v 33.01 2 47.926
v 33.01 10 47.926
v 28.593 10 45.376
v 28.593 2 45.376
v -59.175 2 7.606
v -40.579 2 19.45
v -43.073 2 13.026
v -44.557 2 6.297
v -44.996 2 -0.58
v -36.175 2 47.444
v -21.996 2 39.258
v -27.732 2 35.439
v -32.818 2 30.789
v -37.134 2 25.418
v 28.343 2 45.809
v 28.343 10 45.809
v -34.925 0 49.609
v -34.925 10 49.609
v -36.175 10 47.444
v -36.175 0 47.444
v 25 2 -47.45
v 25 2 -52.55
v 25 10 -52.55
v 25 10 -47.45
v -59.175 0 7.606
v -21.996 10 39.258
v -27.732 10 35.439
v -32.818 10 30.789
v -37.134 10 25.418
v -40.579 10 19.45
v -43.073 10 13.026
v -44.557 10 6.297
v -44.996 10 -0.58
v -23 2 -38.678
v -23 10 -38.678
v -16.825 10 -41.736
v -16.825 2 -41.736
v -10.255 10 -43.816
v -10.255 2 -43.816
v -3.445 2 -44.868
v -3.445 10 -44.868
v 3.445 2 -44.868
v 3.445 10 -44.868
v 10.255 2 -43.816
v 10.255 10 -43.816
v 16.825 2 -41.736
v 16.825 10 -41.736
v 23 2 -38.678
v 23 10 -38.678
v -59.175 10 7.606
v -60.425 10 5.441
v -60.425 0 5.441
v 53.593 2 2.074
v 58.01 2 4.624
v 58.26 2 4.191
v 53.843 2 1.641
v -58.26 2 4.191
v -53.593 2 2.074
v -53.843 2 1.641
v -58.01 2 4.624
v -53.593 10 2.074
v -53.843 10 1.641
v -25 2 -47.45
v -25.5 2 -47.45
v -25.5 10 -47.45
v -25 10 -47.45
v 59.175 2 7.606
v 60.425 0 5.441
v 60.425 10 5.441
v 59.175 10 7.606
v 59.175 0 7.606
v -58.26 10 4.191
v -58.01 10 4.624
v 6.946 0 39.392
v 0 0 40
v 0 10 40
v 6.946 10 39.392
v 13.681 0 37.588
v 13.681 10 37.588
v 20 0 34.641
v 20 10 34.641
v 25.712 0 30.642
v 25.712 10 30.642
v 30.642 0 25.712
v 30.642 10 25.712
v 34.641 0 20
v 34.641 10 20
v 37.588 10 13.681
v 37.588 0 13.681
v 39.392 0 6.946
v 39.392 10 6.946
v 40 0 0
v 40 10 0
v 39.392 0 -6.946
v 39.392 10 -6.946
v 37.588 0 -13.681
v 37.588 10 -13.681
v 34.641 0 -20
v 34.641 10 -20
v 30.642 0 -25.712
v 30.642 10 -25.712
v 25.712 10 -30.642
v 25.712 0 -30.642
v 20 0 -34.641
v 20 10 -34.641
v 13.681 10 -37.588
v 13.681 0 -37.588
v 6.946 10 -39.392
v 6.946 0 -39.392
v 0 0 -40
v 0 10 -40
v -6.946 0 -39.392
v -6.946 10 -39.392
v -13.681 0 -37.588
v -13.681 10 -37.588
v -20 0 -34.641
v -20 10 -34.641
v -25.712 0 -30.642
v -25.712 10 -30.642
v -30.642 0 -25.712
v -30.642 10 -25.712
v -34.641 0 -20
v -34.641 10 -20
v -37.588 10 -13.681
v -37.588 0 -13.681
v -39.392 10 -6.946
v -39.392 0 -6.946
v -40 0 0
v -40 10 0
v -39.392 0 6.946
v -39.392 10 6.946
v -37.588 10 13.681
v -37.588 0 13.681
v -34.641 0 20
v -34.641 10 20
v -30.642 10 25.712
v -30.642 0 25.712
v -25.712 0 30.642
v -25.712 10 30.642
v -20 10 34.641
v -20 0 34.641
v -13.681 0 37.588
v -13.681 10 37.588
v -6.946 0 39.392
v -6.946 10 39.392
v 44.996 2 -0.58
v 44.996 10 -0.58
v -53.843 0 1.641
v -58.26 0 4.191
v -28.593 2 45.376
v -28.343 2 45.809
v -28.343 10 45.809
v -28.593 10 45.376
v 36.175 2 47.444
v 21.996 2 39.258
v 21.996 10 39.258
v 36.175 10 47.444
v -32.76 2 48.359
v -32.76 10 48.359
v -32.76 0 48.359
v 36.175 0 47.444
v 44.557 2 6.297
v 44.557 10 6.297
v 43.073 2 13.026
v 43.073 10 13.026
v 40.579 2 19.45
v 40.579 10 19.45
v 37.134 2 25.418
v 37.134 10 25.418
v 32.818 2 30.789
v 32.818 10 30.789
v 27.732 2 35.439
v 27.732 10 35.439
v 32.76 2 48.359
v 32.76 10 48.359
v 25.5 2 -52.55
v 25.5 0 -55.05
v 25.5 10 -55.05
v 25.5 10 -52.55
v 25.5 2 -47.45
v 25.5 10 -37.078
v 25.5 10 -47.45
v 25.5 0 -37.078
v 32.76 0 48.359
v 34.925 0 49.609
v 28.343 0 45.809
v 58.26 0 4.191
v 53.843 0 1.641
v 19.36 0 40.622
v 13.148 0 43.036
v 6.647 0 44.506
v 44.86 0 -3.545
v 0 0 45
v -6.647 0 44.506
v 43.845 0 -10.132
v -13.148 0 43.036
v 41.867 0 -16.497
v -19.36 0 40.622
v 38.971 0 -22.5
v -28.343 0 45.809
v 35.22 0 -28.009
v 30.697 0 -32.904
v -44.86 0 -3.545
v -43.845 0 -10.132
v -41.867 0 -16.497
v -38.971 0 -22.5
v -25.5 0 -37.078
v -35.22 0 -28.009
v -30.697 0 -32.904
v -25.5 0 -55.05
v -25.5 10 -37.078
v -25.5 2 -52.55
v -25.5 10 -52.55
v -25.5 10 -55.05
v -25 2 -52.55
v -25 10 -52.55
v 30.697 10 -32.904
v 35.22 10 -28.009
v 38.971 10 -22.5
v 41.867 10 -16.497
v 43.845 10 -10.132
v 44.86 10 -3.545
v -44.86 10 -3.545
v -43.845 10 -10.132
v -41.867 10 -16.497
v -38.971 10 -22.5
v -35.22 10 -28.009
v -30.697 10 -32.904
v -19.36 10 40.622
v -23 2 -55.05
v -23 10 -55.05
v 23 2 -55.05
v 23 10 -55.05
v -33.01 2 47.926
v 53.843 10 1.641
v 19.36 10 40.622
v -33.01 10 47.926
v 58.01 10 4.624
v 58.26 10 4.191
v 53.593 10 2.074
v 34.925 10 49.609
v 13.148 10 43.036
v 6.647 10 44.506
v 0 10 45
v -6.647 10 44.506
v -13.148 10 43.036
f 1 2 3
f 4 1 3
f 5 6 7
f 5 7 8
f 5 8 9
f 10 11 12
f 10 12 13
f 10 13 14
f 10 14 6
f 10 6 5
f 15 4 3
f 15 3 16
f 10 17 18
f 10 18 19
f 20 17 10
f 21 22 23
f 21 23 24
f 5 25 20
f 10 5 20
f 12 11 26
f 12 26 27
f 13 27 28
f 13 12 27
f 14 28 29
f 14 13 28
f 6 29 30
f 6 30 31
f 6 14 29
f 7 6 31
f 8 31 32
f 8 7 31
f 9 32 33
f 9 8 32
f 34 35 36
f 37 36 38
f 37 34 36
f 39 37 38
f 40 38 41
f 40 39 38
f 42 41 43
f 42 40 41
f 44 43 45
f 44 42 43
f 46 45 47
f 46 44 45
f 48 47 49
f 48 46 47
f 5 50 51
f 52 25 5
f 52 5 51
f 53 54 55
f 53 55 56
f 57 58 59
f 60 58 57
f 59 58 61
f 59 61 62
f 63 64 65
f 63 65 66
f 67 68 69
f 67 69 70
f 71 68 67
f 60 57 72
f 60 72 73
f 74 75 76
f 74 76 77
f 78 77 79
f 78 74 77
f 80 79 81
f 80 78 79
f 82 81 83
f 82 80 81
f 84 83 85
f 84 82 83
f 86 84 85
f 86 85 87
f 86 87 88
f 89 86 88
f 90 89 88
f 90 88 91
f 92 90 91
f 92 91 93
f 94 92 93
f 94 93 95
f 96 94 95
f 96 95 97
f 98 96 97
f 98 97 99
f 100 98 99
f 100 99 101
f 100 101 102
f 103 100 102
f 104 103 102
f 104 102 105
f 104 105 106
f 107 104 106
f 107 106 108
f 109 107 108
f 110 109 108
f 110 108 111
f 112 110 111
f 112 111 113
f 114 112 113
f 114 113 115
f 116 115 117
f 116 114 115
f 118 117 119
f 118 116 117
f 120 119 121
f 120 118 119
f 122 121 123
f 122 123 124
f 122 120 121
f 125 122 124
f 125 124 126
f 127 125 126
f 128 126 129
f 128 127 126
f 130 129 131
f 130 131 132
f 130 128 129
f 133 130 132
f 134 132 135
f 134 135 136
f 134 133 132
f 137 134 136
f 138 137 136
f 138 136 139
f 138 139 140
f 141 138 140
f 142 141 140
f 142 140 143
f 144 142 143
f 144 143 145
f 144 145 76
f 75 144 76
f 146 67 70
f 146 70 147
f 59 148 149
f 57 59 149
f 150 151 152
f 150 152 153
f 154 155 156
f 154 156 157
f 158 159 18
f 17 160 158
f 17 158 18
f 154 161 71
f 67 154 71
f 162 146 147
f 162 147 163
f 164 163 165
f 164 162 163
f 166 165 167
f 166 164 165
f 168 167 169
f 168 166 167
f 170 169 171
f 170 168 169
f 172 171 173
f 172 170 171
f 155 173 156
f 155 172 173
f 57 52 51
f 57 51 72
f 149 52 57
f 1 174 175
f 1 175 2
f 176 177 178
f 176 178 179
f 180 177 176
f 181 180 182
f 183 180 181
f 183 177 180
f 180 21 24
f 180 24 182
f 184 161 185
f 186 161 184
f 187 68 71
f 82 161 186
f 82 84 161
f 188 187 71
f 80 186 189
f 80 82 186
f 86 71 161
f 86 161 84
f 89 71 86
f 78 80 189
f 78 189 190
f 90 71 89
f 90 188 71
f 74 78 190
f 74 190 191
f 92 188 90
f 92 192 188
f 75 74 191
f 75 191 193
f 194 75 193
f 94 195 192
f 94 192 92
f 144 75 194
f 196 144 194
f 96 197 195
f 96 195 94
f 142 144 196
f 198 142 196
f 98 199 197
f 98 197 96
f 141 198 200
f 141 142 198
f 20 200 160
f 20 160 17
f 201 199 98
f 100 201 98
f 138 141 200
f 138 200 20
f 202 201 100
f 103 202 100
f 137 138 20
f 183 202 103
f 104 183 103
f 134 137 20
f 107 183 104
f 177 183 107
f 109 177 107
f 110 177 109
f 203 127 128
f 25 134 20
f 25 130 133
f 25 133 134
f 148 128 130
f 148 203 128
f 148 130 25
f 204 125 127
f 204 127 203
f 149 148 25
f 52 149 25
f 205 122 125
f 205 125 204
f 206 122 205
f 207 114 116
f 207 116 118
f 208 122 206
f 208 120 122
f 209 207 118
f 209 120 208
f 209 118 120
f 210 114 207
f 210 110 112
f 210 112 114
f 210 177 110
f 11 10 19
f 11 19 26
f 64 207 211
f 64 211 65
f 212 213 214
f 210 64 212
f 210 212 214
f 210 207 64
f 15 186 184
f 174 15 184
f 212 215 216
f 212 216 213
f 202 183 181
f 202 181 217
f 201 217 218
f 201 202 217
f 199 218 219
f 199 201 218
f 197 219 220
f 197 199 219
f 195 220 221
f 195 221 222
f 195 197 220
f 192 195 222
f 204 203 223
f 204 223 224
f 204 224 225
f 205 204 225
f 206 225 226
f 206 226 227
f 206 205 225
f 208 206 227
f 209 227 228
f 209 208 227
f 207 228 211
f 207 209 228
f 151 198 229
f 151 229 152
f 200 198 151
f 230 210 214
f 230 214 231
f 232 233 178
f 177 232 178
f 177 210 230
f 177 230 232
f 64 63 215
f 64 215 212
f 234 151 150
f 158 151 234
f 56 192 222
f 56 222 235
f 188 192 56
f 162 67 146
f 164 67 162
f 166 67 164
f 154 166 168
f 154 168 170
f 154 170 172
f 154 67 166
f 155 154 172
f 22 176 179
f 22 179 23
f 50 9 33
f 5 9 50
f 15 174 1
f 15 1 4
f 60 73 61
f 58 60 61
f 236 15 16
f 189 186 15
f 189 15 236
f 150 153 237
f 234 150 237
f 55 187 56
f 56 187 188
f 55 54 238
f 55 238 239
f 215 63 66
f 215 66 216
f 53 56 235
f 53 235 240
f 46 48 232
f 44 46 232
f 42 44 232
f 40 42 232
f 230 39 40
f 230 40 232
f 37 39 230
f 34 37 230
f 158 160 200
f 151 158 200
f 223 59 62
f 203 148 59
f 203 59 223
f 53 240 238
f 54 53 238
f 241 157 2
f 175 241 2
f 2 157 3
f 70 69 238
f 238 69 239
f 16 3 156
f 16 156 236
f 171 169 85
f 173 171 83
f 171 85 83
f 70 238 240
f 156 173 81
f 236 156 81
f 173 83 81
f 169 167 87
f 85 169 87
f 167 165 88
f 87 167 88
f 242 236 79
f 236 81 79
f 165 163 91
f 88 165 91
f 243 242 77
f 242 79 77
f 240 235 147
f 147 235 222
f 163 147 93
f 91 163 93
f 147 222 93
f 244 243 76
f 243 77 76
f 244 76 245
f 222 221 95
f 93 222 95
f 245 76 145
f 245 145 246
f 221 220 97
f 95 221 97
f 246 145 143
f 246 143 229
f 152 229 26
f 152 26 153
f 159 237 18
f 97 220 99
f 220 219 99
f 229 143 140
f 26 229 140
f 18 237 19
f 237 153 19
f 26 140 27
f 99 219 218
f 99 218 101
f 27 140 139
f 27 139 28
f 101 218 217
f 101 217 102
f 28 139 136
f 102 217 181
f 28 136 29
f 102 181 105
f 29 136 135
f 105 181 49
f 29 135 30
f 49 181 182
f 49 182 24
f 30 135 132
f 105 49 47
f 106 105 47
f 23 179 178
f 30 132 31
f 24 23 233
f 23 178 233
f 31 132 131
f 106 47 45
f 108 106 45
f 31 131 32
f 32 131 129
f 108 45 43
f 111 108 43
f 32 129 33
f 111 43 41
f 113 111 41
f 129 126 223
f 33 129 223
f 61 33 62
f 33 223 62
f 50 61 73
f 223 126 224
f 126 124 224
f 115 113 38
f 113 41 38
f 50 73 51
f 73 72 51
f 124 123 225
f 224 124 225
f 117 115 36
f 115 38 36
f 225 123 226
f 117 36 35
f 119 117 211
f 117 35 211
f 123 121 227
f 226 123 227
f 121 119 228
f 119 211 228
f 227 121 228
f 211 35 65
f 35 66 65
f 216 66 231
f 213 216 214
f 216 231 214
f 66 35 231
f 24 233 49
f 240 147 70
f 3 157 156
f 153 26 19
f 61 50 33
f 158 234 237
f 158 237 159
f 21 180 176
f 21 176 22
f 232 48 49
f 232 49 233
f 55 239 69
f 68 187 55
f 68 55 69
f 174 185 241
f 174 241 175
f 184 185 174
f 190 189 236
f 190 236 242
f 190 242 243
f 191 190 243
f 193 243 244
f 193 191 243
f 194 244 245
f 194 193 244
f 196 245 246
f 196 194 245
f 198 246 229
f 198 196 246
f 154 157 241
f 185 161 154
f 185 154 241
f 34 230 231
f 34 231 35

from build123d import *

# Parameters (mm, degrees)
SKETCH1_R           = 40
BOSS_EXTRUDE1_DEPTH = 10
SKETCH2_R           = 40
BOSS_EXTRUDE2_DEPTH = 2


with BuildPart() as part:
    # Sketch1 → Boss-Extrude1 (new body)
    with BuildSketch(Plane(origin=(0, 0, 0), x_dir=(1, 0, 0), z_dir=(0, 1, 0))):
        with BuildLine():
            Line((-25.5, 37.077621283), (-25.5, 47.45))
            Line((-25.5, 47.45), (-25, 47.45))
            Line((-25, 47.45), (-25, 52.55))
            Line((-25, 52.55), (-25.5, 52.55))
            Line((-25.5, 52.55), (-25.5, 55.05))
            Line((-25.5, 55.05), (-23, 55.05))
            Line((-23, 55.05), (-23, 38.678159212))
            ThreePointArc((-23, 38.678159212), (0, 45), (23, 38.678159212))
            Line((23, 38.678159212), (23, 55.05))
            Line((23, 55.05), (25.5, 55.05))
            Line((25.5, 55.05), (25.5, 52.55))
            Line((25.5, 52.55), (25, 52.55))
            Line((25, 52.55), (25, 47.45))
            Line((25, 47.45), (25.5, 47.45))
            Line((25.5, 47.45), (25.5, 37.077621283))
            ThreePointArc((25.5, 37.077621283), (38.97114317, 22.5), (44.860161943, 3.544837155))
            Line((44.860161943, 3.544837155), (53.84290541, -1.641352203))
            Line((53.84290541, -1.641352203), (53.59290541, -2.074364905))
            Line((53.59290541, -2.074364905), (58.009634969, -4.624364905))
            Line((58.009634969, -4.624364905), (58.259634969, -4.191352203))
            Line((58.259634969, -4.191352203), (60.424698478, -5.441352203))
            Line((60.424698478, -5.441352203), (59.174698478, -7.606415713))
            Line((59.174698478, -7.606415713), (44.996268449, 0.579504681))
            ThreePointArc((44.996268449, 0.579504681), (38.97114317, -22.5), (21.996268449, -39.257663893))
            Line((21.996268449, -39.257663893), (36.174698478, -47.443584287))
            Line((36.174698478, -47.443584287), (34.924698478, -49.608647797))
            Line((34.924698478, -49.608647797), (32.759634969, -48.358647797))
            Line((32.759634969, -48.358647797), (33.009634969, -47.925635095))
            Line((33.009634969, -47.925635095), (28.59290541, -45.375635095))
            Line((28.59290541, -45.375635095), (28.34290541, -45.808647797))
            Line((28.34290541, -45.808647797), (19.360161943, -40.622458438))
            ThreePointArc((19.360161943, -40.622458438), (0, -45), (-19.360161943, -40.622458438))
            Line((-19.360161943, -40.622458438), (-28.34290541, -45.808647797))
            Line((-28.34290541, -45.808647797), (-28.59290541, -45.375635095))
            Line((-28.59290541, -45.375635095), (-33.009634969, -47.925635095))
            Line((-33.009634969, -47.925635095), (-32.759634969, -48.358647797))
            Line((-32.759634969, -48.358647797), (-34.924698478, -49.608647797))
            Line((-34.924698478, -49.608647797), (-36.174698478, -47.443584287))
            Line((-36.174698478, -47.443584287), (-21.996268449, -39.257663893))
            ThreePointArc((-21.996268449, -39.257663893), (-38.97114317, -22.5), (-44.996268449, 0.579504681))
            Line((-44.996268449, 0.579504681), (-59.174698478, -7.606415713))
            Line((-59.174698478, -7.606415713), (-60.424698478, -5.441352203))
            Line((-60.424698478, -5.441352203), (-58.259634969, -4.191352203))
            Line((-58.259634969, -4.191352203), (-58.009634969, -4.624364905))
            Line((-58.009634969, -4.624364905), (-53.59290541, -2.074364905))
            Line((-53.59290541, -2.074364905), (-53.84290541, -1.641352203))
            Line((-53.84290541, -1.641352203), (-44.860161943, 3.544837155))
            ThreePointArc((-44.860161943, 3.544837155), (-38.97114317, 22.5), (-25.5, 37.077621283))
        make_face()
        with Locations(Location((0, 0, 0), (0, 0, 270))):
            Circle(SKETCH1_R, mode=Mode.SUBTRACT)
    extrude(amount=BOSS_EXTRUDE1_DEPTH)

    # Sketch2 → Boss-Extrude2 (add)
    with BuildSketch(Plane.XZ):
        with BuildLine():
            Line((-60.424698478, 5.441352203), (-34.924698478, 49.608647797))
            Line((-34.924698478, 49.608647797), (-19.360161943, 40.622458438))
            ThreePointArc((-19.360161943, 40.622458438), (0, 45), (19.360161943, 40.622458438))
            Line((19.360161943, 40.622458438), (34.924698478, 49.608647797))
            Line((34.924698478, 49.608647797), (60.424698478, 5.441352203))
            Line((60.424698478, 5.441352203), (44.860161943, -3.544837155))
            ThreePointArc((44.860161943, -3.544837155), (38.97114317, -22.5), (25.5, -37.077621283))
            Line((25.5, -37.077621283), (25.5, -55.05))
            Line((25.5, -55.05), (-25.5, -55.05))
            Line((-25.5, -55.05), (-25.5, -37.077621283))
            ThreePointArc((-25.5, -37.077621283), (-38.97114317, -22.5), (-44.860161943, -3.544837155))
            Line((-44.860161943, -3.544837155), (-60.424698478, 5.441352203))
        make_face()
        with Locations(Location((0, 0, 0), (0, 0, 90))):
            Circle(SKETCH2_R, mode=Mode.SUBTRACT)
    extrude(amount=-BOSS_EXTRUDE2_DEPTH)


solid = part.part
